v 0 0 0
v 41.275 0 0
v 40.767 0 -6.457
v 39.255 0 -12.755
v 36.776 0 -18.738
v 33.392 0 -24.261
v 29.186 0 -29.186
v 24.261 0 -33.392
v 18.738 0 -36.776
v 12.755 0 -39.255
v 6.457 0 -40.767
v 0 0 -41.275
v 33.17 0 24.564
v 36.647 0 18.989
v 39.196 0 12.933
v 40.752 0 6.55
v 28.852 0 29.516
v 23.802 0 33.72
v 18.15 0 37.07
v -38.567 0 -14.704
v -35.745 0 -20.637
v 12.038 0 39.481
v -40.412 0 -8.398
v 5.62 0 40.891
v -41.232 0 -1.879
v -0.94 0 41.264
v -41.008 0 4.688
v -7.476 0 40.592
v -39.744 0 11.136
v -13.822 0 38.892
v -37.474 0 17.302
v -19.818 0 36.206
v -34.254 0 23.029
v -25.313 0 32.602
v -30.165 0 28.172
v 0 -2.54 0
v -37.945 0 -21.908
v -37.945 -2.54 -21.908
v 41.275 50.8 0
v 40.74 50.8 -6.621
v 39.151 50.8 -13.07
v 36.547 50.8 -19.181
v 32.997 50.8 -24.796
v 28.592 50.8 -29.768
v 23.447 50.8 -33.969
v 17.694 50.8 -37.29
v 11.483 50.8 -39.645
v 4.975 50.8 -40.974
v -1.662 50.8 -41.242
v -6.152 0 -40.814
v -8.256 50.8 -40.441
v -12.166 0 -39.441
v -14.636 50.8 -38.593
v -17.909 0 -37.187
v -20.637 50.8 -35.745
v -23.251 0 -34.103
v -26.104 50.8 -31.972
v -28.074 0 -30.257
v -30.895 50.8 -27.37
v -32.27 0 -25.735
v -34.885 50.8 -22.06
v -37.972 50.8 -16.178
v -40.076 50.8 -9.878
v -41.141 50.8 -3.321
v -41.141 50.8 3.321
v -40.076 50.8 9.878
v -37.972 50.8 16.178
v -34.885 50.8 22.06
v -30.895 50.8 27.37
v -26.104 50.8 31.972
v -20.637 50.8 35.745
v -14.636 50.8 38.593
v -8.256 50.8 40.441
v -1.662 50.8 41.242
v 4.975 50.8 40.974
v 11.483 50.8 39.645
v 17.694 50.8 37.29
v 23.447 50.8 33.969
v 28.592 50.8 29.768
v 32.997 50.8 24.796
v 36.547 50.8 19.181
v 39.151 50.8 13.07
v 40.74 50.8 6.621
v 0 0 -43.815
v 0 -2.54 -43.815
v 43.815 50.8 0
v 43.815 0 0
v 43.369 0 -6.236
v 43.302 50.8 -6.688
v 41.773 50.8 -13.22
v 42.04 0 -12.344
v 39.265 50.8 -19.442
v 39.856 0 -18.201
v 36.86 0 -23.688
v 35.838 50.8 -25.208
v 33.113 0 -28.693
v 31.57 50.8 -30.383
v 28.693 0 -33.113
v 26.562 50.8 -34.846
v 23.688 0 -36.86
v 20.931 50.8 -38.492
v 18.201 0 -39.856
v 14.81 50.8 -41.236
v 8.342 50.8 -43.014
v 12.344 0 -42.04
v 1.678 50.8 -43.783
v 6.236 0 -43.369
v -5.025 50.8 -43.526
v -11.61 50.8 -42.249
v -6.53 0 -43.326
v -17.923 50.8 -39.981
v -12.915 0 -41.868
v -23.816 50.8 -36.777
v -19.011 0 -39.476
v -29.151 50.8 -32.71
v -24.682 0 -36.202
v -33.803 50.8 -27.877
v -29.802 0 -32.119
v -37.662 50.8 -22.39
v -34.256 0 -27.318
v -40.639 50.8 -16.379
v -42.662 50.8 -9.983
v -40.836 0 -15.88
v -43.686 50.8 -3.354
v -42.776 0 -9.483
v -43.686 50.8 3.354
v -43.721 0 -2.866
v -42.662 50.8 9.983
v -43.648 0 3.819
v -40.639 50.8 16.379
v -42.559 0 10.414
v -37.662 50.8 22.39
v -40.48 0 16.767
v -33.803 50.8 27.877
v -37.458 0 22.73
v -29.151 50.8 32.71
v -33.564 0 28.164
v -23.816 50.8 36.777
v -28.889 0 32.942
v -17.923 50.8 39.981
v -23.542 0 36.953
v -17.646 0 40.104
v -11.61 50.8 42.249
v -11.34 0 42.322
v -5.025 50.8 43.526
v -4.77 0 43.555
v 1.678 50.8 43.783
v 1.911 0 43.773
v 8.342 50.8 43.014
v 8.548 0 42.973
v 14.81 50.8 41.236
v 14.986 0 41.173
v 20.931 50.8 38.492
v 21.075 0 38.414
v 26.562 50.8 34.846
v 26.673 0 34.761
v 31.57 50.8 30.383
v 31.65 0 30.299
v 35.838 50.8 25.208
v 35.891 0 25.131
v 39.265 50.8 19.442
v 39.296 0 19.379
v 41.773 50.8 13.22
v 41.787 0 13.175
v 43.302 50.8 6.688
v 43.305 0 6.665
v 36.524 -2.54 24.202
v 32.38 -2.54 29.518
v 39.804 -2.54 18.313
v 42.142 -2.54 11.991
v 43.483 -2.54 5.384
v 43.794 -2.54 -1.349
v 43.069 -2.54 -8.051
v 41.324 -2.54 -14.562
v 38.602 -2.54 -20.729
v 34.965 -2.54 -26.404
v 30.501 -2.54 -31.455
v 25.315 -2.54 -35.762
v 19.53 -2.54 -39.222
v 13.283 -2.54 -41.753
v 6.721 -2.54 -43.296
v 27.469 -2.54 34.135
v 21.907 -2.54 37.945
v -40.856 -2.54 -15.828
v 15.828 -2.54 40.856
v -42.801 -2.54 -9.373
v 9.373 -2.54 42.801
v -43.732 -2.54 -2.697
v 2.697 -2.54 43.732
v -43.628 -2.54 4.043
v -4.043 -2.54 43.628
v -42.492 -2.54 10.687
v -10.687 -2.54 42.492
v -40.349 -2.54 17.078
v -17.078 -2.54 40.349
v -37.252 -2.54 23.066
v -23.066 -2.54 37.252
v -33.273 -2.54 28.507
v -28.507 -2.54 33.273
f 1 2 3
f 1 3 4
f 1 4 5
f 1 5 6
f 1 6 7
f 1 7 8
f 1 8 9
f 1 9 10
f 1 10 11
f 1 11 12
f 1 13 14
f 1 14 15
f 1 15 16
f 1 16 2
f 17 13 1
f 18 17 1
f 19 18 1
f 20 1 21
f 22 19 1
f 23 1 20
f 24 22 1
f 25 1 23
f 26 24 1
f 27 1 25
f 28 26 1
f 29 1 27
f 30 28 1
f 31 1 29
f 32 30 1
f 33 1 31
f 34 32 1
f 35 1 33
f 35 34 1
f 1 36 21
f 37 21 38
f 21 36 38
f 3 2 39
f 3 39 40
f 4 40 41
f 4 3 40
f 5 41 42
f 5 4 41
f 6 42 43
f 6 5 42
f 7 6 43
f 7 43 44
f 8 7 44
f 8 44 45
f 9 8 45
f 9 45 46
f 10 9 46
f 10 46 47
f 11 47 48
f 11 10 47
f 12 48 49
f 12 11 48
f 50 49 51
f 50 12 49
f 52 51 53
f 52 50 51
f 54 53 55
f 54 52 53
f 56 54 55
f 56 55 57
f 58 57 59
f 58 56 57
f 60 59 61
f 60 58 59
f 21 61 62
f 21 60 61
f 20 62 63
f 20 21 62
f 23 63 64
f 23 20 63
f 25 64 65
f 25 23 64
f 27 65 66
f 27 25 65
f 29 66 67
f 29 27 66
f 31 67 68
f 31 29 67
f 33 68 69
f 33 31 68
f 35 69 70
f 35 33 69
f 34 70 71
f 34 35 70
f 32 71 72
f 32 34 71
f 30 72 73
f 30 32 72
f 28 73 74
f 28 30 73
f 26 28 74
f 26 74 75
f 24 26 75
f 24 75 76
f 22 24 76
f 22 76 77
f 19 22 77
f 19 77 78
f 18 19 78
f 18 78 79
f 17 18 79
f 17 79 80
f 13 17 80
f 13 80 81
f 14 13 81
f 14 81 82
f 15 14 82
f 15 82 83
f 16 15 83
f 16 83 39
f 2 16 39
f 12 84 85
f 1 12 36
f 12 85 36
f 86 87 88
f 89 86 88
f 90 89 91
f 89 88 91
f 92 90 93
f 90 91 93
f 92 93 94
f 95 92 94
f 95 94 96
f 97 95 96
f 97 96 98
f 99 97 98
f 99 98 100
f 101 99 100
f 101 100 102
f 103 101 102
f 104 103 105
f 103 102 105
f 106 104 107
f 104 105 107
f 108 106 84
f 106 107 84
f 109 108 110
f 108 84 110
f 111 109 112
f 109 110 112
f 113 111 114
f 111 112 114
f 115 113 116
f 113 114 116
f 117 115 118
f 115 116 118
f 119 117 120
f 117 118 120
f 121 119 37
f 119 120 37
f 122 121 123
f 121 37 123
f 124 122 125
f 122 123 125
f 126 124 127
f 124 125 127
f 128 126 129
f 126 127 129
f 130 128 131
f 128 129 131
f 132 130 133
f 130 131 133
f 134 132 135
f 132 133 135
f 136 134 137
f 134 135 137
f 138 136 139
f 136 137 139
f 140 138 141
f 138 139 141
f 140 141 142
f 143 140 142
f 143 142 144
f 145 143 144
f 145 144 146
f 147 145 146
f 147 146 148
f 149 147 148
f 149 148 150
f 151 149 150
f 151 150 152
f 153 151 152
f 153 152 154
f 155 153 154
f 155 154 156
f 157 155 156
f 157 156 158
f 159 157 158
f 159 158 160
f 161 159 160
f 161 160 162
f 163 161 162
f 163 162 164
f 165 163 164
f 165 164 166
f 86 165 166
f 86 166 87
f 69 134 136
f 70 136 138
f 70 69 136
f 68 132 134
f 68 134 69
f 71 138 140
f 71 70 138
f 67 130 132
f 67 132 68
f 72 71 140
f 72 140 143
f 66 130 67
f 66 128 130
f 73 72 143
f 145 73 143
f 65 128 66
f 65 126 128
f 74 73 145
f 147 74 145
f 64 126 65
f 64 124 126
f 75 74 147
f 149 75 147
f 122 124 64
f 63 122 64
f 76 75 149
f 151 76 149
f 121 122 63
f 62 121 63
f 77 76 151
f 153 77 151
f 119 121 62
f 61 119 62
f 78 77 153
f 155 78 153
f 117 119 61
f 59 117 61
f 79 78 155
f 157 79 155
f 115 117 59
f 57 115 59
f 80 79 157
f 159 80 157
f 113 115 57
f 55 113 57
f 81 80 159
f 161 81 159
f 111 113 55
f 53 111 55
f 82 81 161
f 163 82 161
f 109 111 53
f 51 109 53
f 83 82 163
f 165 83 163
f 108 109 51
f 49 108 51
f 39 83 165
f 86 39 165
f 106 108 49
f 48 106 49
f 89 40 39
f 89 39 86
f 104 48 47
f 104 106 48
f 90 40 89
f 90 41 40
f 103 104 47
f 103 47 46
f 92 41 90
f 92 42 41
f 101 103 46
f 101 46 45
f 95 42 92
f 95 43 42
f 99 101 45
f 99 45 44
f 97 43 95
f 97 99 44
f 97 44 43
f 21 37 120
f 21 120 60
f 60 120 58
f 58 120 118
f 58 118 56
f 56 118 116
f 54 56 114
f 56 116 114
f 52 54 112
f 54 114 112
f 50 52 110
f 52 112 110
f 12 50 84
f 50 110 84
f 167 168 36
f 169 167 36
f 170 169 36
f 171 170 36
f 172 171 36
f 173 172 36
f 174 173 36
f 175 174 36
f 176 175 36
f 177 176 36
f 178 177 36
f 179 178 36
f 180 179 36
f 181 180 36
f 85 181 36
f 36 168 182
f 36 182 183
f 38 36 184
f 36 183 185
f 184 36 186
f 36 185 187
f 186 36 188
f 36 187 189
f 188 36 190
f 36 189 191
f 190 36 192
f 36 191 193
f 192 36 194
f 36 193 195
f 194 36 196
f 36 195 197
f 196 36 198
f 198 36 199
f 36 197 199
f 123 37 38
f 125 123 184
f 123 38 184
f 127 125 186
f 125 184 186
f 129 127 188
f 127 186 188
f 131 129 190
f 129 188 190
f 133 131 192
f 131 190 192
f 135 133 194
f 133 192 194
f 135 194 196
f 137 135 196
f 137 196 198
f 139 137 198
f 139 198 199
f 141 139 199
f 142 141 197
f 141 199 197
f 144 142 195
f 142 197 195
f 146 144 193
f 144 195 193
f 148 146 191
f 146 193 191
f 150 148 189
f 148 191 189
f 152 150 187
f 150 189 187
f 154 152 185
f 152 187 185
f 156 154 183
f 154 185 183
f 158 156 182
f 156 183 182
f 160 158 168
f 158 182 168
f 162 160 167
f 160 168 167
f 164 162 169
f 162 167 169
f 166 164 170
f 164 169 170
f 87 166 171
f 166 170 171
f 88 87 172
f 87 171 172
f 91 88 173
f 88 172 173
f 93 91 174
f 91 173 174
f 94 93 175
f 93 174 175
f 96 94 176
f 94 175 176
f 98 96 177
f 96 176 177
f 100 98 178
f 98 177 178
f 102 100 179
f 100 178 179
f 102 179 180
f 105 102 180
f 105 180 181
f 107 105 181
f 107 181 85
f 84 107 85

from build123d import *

# Parameters (mm, degrees)
SKETCH1_R           = 43.815
SKETCH1_R_2         = 41.275
EXTRUDE_THIN1_DEPTH = 50.8
BOSS_EXTRUDE1_START = 2.54
BOSS_EXTRUDE1_DEPTH = 2.54


with BuildPart() as part:
    # Sketch1 → Extrude-Thin1 (new body)
    with BuildSketch(Plane(origin=(0, 0, 0), x_dir=(1, 0, 0), z_dir=(0, 1, 0))):
        Circle(SKETCH1_R)
        Circle(SKETCH1_R_2, mode=Mode.SUBTRACT)
    extrude(amount=EXTRUDE_THIN1_DEPTH)

    # Sketch2 → Boss-Extrude1 (add)
    with BuildSketch(Plane.XZ.offset(BOSS_EXTRUDE1_START)):
        with BuildLine():
            Line((0, -43.815), (0, 0))
            Line((0, 0), (-37.944903067, -21.9075))
            ThreePointArc((-37.944903067, -21.9075), (21.9075, 37.944903067), (0, -43.815))
        make_face()
    extrude(amount=-BOSS_EXTRUDE1_DEPTH)


solid = part.part
